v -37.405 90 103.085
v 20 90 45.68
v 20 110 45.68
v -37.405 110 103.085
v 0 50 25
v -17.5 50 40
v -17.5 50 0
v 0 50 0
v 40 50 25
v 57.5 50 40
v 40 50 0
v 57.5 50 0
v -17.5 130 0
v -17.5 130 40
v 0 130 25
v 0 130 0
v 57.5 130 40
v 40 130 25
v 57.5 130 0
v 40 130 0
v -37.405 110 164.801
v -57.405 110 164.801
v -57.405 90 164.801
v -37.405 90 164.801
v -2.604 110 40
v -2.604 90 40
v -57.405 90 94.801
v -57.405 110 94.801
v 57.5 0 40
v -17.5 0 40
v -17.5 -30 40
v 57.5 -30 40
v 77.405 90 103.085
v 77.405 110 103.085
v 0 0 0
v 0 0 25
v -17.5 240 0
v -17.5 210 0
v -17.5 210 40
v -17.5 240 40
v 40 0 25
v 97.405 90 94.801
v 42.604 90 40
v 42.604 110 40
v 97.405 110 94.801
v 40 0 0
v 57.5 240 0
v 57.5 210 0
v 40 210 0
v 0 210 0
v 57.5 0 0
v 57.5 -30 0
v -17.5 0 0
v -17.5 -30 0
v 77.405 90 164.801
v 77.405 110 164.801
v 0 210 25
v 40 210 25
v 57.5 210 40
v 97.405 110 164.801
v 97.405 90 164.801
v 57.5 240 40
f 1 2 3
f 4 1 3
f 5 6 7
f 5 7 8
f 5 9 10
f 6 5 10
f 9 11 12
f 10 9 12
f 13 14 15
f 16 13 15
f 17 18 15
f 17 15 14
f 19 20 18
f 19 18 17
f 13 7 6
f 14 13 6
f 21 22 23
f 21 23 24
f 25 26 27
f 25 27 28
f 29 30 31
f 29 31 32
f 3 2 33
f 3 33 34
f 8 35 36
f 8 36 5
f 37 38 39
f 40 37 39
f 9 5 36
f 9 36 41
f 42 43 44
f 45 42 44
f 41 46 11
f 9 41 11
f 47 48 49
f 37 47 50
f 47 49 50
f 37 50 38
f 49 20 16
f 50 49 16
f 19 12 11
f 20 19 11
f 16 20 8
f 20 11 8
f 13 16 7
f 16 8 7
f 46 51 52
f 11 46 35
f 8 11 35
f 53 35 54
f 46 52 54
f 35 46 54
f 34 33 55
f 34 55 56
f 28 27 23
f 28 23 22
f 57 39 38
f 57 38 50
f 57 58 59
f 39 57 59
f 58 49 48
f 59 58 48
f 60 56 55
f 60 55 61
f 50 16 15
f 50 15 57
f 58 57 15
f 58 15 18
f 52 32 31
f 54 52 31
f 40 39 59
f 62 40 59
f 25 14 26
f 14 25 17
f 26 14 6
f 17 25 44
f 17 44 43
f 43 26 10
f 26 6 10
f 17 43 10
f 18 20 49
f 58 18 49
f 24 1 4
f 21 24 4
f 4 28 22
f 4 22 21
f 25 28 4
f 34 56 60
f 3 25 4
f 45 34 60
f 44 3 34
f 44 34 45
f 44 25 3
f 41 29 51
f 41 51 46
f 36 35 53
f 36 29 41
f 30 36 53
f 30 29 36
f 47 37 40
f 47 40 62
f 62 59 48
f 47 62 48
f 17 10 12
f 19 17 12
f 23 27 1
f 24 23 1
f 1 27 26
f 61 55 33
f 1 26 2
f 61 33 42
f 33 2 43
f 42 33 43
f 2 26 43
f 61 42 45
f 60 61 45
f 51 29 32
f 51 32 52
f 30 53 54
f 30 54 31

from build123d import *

# Parameters (mm, degrees)
SKETCH1_W           = 40
SKETCH1_H           = 210
BOSS_EXTRUDE1_DEPTH = 25
SKETCH2_W           = 40
SKETCH2_H           = 25
BOSS_EXTRUDE2_DEPTH = 30
SKETCH3_W           = 40
SKETCH3_H           = 25
BOSS_EXTRUDE3_DEPTH = 30
BOSS_EXTRUDE4_DEPTH = 80
SKETCH6_W           = 20
SKETCH6_H           = 20
BOSS_EXTRUDE5_DEPTH = 120
SKETCH7_W           = 20
SKETCH7_H           = 20
BOSS_EXTRUDE6_DEPTH = 120
SKETCH8_W           = 20
SKETCH8_H           = 20
BOSS_EXTRUDE7_DEPTH = 70


with BuildPart() as part:
    # Sketch1 → Boss-Extrude1 (new body)
    with BuildSketch(Plane.XY):
        with Locations((20, 105)):
            Rectangle(SKETCH1_W, SKETCH1_H)
    extrude(amount=BOSS_EXTRUDE1_DEPTH)

    # Sketch2 → Boss-Extrude2 (add)
    with BuildSketch(Plane(origin=(0, 210, 0), x_dir=(1, 0, 0), z_dir=(0, 1, 0))):
        Polygon((0, 0), (-17.5, 0), (-17.5, -40), (57.5, -40), (57.5, 0), (40, 0), (40, -25), (0, -25), align=None)
        with Locations((20, -12.5)):
            Rectangle(SKETCH2_W, SKETCH2_H)
    extrude(amount=BOSS_EXTRUDE2_DEPTH)

    # Sketch3 → Boss-Extrude3 (add)
    with BuildSketch(Plane.XZ):
        Polygon((57.5, 40), (57.5, 0), (40, 0), (40, 25), (0, 25), (0, 0), (-17.5, 0), (-17.5, 40), align=None)
        with Locations((20, 12.5)):
            Rectangle(SKETCH3_W, SKETCH3_H)
    extrude(amount=BOSS_EXTRUDE3_DEPTH)

    # Sketch5 → Boss-Extrude4 (add)
    with BuildSketch(Plane(origin=(0, 50, 0), x_dir=(1, 0, 0), z_dir=(0, 1, 0))):
        Polygon((57.5, 0), (0, 0), (-17.5, 0), (-17.5, -40), (57.5, -40), align=None)
    extrude(amount=BOSS_EXTRUDE4_DEPTH)

    # Sketch6 → Boss-Extrude5 (add)
    with BuildSketch(Plane(origin=(11.25, 0, 11.25), x_dir=(0.707106781, 0, -0.707106781), z_dir=(0.707106781, 0, 0.707106781))):
        with Locations((-8.158639918, 100)):
            Rectangle(SKETCH6_W, SKETCH6_H)
    extrude(amount=BOSS_EXTRUDE5_DEPTH)

    # Sketch7 → Boss-Extrude6 (add)
    with BuildSketch(Plane(origin=(8.75, 0, -8.75), x_dir=(0.707106781, 0, 0.707106781), z_dir=(-0.707106781, 0, 0.707106781))):
        with Locations((36.442911166, 100)):
            Rectangle(SKETCH7_W, SKETCH7_H)
    extrude(amount=BOSS_EXTRUDE6_DEPTH)

    # Sketch8 → Boss-Extrude7 (add)
    with BuildSketch(Plane.XY.offset(94.800775542)):
        with Locations((-47.404851943, 100)):
            Rectangle(SKETCH8_W, SKETCH8_H)
        with Locations((87.404851943, 100)):
            Rectangle(SKETCH8_W, SKETCH8_H)
    extrude(amount=BOSS_EXTRUDE7_DEPTH)


solid = part.part
